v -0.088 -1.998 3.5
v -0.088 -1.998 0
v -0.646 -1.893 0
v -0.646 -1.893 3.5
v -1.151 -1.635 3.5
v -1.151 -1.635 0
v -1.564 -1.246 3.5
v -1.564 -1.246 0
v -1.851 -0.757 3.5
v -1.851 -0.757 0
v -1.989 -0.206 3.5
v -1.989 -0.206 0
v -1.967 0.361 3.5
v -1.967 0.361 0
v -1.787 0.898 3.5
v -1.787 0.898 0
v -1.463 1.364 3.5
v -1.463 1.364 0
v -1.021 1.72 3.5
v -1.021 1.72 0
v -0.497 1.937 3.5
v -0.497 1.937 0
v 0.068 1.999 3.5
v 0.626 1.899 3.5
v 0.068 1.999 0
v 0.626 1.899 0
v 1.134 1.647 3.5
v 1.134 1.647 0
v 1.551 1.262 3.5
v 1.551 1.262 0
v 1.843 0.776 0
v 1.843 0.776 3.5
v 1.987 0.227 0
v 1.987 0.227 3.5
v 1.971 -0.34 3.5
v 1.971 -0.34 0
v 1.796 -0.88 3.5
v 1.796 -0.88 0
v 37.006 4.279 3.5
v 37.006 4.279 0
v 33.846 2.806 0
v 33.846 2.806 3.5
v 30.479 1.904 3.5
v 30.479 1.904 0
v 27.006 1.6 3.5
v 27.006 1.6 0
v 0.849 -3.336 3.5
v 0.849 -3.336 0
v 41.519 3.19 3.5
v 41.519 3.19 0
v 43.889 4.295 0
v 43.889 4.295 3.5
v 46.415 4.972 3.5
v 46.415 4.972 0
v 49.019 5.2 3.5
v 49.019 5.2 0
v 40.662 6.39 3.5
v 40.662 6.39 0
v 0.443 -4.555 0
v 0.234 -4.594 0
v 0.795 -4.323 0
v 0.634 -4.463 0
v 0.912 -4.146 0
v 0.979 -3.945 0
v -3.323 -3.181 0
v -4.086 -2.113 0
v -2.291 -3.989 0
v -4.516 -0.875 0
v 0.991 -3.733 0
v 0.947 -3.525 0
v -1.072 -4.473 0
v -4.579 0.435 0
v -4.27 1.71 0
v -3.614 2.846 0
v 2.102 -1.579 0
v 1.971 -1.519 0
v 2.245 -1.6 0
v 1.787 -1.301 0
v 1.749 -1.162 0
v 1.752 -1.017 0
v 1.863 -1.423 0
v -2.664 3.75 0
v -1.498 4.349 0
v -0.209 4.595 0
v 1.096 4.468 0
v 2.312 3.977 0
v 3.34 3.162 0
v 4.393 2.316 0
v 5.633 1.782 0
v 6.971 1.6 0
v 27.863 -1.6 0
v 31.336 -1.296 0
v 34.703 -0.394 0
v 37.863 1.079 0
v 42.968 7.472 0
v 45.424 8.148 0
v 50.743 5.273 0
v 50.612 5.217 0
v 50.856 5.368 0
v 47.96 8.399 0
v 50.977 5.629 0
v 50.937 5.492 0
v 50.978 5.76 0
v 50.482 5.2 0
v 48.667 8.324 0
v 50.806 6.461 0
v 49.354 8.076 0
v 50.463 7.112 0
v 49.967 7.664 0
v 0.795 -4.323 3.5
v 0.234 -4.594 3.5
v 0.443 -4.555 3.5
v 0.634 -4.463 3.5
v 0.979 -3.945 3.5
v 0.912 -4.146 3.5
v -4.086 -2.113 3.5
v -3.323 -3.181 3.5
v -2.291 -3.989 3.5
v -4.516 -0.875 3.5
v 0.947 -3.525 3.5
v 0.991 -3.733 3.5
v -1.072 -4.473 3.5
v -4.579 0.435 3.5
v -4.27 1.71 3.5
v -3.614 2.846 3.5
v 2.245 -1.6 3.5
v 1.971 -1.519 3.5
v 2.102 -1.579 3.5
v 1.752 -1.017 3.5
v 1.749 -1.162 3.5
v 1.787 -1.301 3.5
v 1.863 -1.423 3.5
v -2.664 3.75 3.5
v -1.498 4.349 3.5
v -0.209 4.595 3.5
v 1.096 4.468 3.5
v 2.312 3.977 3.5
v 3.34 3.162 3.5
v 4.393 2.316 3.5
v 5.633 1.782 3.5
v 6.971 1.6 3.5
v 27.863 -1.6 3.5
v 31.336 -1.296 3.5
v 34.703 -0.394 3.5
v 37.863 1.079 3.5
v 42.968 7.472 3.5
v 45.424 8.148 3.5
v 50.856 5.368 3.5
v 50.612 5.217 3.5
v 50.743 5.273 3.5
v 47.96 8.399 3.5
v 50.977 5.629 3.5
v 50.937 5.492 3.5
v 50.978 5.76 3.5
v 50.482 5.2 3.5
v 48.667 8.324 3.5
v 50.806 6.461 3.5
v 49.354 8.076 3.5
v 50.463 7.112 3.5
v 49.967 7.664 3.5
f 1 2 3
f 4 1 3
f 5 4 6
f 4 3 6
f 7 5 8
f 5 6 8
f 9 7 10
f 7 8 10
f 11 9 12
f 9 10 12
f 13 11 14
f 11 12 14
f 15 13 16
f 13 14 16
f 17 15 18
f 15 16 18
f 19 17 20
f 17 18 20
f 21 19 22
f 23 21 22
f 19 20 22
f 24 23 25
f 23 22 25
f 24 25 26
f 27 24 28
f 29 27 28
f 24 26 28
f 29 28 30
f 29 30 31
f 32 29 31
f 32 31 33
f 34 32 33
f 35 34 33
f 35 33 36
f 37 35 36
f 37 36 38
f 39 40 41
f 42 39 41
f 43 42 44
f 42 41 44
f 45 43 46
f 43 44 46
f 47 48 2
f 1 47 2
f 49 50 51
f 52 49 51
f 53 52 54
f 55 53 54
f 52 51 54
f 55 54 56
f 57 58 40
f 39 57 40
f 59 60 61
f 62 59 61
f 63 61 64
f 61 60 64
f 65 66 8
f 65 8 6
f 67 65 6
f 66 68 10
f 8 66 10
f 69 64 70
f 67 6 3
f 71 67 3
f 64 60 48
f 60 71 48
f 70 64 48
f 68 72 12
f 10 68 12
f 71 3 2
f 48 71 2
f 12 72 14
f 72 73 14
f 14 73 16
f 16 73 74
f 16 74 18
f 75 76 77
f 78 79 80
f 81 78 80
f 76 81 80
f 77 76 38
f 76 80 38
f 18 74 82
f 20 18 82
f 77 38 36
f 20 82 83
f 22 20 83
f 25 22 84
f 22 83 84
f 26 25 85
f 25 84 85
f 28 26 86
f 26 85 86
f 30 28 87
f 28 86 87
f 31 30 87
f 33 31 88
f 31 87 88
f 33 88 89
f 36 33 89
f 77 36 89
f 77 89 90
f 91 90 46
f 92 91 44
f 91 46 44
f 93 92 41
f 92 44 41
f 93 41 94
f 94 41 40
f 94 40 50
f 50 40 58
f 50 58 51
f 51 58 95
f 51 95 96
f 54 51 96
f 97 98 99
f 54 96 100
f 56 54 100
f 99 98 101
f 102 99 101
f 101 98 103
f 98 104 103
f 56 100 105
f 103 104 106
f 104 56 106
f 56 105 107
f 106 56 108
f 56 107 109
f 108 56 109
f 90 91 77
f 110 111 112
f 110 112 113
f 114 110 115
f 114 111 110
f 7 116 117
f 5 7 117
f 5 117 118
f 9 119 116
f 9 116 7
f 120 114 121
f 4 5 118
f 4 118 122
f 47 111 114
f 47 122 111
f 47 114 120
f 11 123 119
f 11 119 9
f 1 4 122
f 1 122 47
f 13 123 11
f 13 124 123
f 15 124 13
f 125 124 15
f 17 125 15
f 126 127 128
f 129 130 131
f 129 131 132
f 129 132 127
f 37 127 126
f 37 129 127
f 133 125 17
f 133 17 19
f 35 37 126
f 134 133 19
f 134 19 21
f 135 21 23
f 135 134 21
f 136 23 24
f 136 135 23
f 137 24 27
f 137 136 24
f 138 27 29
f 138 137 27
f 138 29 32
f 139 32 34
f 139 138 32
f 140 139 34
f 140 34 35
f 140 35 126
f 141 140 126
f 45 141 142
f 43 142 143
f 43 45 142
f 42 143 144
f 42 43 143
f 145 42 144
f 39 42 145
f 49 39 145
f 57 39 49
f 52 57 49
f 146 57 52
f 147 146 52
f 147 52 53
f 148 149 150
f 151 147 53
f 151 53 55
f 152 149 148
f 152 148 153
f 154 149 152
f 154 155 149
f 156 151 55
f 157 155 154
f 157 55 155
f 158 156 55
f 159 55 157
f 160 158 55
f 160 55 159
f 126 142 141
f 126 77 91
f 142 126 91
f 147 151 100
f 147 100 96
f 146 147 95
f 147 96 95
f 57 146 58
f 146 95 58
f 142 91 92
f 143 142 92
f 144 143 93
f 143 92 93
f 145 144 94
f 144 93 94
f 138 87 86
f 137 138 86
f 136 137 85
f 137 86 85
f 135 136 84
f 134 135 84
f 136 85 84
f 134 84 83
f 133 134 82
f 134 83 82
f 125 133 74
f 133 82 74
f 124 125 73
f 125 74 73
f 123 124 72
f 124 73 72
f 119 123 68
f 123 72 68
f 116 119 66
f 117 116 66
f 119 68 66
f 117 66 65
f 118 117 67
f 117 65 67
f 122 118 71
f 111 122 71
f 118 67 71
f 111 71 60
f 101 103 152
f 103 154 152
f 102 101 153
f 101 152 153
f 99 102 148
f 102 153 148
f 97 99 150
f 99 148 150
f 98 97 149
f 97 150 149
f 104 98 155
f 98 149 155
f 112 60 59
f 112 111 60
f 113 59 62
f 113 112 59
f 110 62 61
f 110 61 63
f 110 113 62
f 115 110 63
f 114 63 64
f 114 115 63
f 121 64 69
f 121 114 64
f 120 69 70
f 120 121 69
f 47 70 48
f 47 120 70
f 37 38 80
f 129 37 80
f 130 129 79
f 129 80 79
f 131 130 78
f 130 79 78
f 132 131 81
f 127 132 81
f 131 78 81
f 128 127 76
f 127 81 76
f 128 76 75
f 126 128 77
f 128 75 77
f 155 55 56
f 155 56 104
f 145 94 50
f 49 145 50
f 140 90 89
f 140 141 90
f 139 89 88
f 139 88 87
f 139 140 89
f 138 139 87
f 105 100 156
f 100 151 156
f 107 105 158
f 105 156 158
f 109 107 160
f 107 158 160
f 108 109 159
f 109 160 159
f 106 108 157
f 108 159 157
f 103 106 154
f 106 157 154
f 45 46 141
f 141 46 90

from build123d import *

# Parameters (mm, degrees)
F1_DEPTH = 3.5
F2_R     = 5
F3_R     = 0.8
F4_R     = 3
F5_R     = 0.5


with BuildPart() as f1:
    # F0 (on Top) → F1 (new body)
    with BuildSketch(Plane.XY):
        with BuildLine():
            Line((27.0056332441, 1.6), (4.3127717306, 1.6))
            ThreePointArc((4.3127717306, 1.6), (-4.1689707148, 1.9441407303), (1.5463240937, -4.3323067525))
            Line((1.5463240937, -4.3323067525), (-0.0881351041, -1.9980571072))
            ThreePointArc((-0.0881351041, -1.9980571072), (-1.0206418303, 1.7199680969), (1.7959955457, -0.88))
            ThreePointArc((1.7959955457, -0.88), (1.8207303634, -1.3645751311), (2.2449944321, -1.6))
            Line((2.2449944321, -1.6), (4.3127717306, -1.6))
            Line((4.3127717306, -1.6), (27.8630706599, -1.6))
            ThreePointArc((27.8630706599, -1.6), (33.039451562, -0.9185165258), (37.8630706599, 1.0794919243))
            Line((37.8630706599, 1.0794919243), (41.5192378865, 3.1903810568))
            ThreePointArc((41.5192378865, 3.1903810568), (45.1369522099, 4.6888873943), (49.0192378865, 5.2))
            Line((49.0192378865, 5.2), (51, 5.2))
            Line((51, 5.2), (51, 8.4))
            Line((51, 8.4), (48.1618004707, 8.4))
            ThreePointArc((48.1618004707, 8.4), (44.2795147941, 7.8888873943), (40.6618004707, 6.3903810568))
            Line((40.6618004707, 6.3903810568), (37.0056332441, 4.2794919243))
            ThreePointArc((37.0056332441, 4.2794919243), (32.1820141462, 2.2814834742), (27.0056332441, 1.6))
        make_face()
    extrude(amount=F1_DEPTH)

    # F2
    f2_edges = [f1.edges().sort_by_distance(p)[0] for p in [
        (4.312772, 1.6, 1.75),
        (27.863071, -1.6, 1.75),
    ]]
    fillet(f2_edges, radius=F2_R)

    # F3
    f3_edges = [f1.edges().sort_by_distance(p)[0] for p in [
        (1.546324, -4.332307, 1.75),
    ]]
    fillet(f3_edges, radius=F3_R)

    # F4
    f4_edges = [f1.edges().sort_by_distance(p)[0] for p in [
        (51, 8.4, 1.75),
    ]]
    fillet(f4_edges, radius=F4_R)

    # F5
    f5_edges = [f1.edges().sort_by_distance(p)[0] for p in [
        (51, 5.2, 1.75),
    ]]
    fillet(f5_edges, radius=F5_R)


solid = f1.part
